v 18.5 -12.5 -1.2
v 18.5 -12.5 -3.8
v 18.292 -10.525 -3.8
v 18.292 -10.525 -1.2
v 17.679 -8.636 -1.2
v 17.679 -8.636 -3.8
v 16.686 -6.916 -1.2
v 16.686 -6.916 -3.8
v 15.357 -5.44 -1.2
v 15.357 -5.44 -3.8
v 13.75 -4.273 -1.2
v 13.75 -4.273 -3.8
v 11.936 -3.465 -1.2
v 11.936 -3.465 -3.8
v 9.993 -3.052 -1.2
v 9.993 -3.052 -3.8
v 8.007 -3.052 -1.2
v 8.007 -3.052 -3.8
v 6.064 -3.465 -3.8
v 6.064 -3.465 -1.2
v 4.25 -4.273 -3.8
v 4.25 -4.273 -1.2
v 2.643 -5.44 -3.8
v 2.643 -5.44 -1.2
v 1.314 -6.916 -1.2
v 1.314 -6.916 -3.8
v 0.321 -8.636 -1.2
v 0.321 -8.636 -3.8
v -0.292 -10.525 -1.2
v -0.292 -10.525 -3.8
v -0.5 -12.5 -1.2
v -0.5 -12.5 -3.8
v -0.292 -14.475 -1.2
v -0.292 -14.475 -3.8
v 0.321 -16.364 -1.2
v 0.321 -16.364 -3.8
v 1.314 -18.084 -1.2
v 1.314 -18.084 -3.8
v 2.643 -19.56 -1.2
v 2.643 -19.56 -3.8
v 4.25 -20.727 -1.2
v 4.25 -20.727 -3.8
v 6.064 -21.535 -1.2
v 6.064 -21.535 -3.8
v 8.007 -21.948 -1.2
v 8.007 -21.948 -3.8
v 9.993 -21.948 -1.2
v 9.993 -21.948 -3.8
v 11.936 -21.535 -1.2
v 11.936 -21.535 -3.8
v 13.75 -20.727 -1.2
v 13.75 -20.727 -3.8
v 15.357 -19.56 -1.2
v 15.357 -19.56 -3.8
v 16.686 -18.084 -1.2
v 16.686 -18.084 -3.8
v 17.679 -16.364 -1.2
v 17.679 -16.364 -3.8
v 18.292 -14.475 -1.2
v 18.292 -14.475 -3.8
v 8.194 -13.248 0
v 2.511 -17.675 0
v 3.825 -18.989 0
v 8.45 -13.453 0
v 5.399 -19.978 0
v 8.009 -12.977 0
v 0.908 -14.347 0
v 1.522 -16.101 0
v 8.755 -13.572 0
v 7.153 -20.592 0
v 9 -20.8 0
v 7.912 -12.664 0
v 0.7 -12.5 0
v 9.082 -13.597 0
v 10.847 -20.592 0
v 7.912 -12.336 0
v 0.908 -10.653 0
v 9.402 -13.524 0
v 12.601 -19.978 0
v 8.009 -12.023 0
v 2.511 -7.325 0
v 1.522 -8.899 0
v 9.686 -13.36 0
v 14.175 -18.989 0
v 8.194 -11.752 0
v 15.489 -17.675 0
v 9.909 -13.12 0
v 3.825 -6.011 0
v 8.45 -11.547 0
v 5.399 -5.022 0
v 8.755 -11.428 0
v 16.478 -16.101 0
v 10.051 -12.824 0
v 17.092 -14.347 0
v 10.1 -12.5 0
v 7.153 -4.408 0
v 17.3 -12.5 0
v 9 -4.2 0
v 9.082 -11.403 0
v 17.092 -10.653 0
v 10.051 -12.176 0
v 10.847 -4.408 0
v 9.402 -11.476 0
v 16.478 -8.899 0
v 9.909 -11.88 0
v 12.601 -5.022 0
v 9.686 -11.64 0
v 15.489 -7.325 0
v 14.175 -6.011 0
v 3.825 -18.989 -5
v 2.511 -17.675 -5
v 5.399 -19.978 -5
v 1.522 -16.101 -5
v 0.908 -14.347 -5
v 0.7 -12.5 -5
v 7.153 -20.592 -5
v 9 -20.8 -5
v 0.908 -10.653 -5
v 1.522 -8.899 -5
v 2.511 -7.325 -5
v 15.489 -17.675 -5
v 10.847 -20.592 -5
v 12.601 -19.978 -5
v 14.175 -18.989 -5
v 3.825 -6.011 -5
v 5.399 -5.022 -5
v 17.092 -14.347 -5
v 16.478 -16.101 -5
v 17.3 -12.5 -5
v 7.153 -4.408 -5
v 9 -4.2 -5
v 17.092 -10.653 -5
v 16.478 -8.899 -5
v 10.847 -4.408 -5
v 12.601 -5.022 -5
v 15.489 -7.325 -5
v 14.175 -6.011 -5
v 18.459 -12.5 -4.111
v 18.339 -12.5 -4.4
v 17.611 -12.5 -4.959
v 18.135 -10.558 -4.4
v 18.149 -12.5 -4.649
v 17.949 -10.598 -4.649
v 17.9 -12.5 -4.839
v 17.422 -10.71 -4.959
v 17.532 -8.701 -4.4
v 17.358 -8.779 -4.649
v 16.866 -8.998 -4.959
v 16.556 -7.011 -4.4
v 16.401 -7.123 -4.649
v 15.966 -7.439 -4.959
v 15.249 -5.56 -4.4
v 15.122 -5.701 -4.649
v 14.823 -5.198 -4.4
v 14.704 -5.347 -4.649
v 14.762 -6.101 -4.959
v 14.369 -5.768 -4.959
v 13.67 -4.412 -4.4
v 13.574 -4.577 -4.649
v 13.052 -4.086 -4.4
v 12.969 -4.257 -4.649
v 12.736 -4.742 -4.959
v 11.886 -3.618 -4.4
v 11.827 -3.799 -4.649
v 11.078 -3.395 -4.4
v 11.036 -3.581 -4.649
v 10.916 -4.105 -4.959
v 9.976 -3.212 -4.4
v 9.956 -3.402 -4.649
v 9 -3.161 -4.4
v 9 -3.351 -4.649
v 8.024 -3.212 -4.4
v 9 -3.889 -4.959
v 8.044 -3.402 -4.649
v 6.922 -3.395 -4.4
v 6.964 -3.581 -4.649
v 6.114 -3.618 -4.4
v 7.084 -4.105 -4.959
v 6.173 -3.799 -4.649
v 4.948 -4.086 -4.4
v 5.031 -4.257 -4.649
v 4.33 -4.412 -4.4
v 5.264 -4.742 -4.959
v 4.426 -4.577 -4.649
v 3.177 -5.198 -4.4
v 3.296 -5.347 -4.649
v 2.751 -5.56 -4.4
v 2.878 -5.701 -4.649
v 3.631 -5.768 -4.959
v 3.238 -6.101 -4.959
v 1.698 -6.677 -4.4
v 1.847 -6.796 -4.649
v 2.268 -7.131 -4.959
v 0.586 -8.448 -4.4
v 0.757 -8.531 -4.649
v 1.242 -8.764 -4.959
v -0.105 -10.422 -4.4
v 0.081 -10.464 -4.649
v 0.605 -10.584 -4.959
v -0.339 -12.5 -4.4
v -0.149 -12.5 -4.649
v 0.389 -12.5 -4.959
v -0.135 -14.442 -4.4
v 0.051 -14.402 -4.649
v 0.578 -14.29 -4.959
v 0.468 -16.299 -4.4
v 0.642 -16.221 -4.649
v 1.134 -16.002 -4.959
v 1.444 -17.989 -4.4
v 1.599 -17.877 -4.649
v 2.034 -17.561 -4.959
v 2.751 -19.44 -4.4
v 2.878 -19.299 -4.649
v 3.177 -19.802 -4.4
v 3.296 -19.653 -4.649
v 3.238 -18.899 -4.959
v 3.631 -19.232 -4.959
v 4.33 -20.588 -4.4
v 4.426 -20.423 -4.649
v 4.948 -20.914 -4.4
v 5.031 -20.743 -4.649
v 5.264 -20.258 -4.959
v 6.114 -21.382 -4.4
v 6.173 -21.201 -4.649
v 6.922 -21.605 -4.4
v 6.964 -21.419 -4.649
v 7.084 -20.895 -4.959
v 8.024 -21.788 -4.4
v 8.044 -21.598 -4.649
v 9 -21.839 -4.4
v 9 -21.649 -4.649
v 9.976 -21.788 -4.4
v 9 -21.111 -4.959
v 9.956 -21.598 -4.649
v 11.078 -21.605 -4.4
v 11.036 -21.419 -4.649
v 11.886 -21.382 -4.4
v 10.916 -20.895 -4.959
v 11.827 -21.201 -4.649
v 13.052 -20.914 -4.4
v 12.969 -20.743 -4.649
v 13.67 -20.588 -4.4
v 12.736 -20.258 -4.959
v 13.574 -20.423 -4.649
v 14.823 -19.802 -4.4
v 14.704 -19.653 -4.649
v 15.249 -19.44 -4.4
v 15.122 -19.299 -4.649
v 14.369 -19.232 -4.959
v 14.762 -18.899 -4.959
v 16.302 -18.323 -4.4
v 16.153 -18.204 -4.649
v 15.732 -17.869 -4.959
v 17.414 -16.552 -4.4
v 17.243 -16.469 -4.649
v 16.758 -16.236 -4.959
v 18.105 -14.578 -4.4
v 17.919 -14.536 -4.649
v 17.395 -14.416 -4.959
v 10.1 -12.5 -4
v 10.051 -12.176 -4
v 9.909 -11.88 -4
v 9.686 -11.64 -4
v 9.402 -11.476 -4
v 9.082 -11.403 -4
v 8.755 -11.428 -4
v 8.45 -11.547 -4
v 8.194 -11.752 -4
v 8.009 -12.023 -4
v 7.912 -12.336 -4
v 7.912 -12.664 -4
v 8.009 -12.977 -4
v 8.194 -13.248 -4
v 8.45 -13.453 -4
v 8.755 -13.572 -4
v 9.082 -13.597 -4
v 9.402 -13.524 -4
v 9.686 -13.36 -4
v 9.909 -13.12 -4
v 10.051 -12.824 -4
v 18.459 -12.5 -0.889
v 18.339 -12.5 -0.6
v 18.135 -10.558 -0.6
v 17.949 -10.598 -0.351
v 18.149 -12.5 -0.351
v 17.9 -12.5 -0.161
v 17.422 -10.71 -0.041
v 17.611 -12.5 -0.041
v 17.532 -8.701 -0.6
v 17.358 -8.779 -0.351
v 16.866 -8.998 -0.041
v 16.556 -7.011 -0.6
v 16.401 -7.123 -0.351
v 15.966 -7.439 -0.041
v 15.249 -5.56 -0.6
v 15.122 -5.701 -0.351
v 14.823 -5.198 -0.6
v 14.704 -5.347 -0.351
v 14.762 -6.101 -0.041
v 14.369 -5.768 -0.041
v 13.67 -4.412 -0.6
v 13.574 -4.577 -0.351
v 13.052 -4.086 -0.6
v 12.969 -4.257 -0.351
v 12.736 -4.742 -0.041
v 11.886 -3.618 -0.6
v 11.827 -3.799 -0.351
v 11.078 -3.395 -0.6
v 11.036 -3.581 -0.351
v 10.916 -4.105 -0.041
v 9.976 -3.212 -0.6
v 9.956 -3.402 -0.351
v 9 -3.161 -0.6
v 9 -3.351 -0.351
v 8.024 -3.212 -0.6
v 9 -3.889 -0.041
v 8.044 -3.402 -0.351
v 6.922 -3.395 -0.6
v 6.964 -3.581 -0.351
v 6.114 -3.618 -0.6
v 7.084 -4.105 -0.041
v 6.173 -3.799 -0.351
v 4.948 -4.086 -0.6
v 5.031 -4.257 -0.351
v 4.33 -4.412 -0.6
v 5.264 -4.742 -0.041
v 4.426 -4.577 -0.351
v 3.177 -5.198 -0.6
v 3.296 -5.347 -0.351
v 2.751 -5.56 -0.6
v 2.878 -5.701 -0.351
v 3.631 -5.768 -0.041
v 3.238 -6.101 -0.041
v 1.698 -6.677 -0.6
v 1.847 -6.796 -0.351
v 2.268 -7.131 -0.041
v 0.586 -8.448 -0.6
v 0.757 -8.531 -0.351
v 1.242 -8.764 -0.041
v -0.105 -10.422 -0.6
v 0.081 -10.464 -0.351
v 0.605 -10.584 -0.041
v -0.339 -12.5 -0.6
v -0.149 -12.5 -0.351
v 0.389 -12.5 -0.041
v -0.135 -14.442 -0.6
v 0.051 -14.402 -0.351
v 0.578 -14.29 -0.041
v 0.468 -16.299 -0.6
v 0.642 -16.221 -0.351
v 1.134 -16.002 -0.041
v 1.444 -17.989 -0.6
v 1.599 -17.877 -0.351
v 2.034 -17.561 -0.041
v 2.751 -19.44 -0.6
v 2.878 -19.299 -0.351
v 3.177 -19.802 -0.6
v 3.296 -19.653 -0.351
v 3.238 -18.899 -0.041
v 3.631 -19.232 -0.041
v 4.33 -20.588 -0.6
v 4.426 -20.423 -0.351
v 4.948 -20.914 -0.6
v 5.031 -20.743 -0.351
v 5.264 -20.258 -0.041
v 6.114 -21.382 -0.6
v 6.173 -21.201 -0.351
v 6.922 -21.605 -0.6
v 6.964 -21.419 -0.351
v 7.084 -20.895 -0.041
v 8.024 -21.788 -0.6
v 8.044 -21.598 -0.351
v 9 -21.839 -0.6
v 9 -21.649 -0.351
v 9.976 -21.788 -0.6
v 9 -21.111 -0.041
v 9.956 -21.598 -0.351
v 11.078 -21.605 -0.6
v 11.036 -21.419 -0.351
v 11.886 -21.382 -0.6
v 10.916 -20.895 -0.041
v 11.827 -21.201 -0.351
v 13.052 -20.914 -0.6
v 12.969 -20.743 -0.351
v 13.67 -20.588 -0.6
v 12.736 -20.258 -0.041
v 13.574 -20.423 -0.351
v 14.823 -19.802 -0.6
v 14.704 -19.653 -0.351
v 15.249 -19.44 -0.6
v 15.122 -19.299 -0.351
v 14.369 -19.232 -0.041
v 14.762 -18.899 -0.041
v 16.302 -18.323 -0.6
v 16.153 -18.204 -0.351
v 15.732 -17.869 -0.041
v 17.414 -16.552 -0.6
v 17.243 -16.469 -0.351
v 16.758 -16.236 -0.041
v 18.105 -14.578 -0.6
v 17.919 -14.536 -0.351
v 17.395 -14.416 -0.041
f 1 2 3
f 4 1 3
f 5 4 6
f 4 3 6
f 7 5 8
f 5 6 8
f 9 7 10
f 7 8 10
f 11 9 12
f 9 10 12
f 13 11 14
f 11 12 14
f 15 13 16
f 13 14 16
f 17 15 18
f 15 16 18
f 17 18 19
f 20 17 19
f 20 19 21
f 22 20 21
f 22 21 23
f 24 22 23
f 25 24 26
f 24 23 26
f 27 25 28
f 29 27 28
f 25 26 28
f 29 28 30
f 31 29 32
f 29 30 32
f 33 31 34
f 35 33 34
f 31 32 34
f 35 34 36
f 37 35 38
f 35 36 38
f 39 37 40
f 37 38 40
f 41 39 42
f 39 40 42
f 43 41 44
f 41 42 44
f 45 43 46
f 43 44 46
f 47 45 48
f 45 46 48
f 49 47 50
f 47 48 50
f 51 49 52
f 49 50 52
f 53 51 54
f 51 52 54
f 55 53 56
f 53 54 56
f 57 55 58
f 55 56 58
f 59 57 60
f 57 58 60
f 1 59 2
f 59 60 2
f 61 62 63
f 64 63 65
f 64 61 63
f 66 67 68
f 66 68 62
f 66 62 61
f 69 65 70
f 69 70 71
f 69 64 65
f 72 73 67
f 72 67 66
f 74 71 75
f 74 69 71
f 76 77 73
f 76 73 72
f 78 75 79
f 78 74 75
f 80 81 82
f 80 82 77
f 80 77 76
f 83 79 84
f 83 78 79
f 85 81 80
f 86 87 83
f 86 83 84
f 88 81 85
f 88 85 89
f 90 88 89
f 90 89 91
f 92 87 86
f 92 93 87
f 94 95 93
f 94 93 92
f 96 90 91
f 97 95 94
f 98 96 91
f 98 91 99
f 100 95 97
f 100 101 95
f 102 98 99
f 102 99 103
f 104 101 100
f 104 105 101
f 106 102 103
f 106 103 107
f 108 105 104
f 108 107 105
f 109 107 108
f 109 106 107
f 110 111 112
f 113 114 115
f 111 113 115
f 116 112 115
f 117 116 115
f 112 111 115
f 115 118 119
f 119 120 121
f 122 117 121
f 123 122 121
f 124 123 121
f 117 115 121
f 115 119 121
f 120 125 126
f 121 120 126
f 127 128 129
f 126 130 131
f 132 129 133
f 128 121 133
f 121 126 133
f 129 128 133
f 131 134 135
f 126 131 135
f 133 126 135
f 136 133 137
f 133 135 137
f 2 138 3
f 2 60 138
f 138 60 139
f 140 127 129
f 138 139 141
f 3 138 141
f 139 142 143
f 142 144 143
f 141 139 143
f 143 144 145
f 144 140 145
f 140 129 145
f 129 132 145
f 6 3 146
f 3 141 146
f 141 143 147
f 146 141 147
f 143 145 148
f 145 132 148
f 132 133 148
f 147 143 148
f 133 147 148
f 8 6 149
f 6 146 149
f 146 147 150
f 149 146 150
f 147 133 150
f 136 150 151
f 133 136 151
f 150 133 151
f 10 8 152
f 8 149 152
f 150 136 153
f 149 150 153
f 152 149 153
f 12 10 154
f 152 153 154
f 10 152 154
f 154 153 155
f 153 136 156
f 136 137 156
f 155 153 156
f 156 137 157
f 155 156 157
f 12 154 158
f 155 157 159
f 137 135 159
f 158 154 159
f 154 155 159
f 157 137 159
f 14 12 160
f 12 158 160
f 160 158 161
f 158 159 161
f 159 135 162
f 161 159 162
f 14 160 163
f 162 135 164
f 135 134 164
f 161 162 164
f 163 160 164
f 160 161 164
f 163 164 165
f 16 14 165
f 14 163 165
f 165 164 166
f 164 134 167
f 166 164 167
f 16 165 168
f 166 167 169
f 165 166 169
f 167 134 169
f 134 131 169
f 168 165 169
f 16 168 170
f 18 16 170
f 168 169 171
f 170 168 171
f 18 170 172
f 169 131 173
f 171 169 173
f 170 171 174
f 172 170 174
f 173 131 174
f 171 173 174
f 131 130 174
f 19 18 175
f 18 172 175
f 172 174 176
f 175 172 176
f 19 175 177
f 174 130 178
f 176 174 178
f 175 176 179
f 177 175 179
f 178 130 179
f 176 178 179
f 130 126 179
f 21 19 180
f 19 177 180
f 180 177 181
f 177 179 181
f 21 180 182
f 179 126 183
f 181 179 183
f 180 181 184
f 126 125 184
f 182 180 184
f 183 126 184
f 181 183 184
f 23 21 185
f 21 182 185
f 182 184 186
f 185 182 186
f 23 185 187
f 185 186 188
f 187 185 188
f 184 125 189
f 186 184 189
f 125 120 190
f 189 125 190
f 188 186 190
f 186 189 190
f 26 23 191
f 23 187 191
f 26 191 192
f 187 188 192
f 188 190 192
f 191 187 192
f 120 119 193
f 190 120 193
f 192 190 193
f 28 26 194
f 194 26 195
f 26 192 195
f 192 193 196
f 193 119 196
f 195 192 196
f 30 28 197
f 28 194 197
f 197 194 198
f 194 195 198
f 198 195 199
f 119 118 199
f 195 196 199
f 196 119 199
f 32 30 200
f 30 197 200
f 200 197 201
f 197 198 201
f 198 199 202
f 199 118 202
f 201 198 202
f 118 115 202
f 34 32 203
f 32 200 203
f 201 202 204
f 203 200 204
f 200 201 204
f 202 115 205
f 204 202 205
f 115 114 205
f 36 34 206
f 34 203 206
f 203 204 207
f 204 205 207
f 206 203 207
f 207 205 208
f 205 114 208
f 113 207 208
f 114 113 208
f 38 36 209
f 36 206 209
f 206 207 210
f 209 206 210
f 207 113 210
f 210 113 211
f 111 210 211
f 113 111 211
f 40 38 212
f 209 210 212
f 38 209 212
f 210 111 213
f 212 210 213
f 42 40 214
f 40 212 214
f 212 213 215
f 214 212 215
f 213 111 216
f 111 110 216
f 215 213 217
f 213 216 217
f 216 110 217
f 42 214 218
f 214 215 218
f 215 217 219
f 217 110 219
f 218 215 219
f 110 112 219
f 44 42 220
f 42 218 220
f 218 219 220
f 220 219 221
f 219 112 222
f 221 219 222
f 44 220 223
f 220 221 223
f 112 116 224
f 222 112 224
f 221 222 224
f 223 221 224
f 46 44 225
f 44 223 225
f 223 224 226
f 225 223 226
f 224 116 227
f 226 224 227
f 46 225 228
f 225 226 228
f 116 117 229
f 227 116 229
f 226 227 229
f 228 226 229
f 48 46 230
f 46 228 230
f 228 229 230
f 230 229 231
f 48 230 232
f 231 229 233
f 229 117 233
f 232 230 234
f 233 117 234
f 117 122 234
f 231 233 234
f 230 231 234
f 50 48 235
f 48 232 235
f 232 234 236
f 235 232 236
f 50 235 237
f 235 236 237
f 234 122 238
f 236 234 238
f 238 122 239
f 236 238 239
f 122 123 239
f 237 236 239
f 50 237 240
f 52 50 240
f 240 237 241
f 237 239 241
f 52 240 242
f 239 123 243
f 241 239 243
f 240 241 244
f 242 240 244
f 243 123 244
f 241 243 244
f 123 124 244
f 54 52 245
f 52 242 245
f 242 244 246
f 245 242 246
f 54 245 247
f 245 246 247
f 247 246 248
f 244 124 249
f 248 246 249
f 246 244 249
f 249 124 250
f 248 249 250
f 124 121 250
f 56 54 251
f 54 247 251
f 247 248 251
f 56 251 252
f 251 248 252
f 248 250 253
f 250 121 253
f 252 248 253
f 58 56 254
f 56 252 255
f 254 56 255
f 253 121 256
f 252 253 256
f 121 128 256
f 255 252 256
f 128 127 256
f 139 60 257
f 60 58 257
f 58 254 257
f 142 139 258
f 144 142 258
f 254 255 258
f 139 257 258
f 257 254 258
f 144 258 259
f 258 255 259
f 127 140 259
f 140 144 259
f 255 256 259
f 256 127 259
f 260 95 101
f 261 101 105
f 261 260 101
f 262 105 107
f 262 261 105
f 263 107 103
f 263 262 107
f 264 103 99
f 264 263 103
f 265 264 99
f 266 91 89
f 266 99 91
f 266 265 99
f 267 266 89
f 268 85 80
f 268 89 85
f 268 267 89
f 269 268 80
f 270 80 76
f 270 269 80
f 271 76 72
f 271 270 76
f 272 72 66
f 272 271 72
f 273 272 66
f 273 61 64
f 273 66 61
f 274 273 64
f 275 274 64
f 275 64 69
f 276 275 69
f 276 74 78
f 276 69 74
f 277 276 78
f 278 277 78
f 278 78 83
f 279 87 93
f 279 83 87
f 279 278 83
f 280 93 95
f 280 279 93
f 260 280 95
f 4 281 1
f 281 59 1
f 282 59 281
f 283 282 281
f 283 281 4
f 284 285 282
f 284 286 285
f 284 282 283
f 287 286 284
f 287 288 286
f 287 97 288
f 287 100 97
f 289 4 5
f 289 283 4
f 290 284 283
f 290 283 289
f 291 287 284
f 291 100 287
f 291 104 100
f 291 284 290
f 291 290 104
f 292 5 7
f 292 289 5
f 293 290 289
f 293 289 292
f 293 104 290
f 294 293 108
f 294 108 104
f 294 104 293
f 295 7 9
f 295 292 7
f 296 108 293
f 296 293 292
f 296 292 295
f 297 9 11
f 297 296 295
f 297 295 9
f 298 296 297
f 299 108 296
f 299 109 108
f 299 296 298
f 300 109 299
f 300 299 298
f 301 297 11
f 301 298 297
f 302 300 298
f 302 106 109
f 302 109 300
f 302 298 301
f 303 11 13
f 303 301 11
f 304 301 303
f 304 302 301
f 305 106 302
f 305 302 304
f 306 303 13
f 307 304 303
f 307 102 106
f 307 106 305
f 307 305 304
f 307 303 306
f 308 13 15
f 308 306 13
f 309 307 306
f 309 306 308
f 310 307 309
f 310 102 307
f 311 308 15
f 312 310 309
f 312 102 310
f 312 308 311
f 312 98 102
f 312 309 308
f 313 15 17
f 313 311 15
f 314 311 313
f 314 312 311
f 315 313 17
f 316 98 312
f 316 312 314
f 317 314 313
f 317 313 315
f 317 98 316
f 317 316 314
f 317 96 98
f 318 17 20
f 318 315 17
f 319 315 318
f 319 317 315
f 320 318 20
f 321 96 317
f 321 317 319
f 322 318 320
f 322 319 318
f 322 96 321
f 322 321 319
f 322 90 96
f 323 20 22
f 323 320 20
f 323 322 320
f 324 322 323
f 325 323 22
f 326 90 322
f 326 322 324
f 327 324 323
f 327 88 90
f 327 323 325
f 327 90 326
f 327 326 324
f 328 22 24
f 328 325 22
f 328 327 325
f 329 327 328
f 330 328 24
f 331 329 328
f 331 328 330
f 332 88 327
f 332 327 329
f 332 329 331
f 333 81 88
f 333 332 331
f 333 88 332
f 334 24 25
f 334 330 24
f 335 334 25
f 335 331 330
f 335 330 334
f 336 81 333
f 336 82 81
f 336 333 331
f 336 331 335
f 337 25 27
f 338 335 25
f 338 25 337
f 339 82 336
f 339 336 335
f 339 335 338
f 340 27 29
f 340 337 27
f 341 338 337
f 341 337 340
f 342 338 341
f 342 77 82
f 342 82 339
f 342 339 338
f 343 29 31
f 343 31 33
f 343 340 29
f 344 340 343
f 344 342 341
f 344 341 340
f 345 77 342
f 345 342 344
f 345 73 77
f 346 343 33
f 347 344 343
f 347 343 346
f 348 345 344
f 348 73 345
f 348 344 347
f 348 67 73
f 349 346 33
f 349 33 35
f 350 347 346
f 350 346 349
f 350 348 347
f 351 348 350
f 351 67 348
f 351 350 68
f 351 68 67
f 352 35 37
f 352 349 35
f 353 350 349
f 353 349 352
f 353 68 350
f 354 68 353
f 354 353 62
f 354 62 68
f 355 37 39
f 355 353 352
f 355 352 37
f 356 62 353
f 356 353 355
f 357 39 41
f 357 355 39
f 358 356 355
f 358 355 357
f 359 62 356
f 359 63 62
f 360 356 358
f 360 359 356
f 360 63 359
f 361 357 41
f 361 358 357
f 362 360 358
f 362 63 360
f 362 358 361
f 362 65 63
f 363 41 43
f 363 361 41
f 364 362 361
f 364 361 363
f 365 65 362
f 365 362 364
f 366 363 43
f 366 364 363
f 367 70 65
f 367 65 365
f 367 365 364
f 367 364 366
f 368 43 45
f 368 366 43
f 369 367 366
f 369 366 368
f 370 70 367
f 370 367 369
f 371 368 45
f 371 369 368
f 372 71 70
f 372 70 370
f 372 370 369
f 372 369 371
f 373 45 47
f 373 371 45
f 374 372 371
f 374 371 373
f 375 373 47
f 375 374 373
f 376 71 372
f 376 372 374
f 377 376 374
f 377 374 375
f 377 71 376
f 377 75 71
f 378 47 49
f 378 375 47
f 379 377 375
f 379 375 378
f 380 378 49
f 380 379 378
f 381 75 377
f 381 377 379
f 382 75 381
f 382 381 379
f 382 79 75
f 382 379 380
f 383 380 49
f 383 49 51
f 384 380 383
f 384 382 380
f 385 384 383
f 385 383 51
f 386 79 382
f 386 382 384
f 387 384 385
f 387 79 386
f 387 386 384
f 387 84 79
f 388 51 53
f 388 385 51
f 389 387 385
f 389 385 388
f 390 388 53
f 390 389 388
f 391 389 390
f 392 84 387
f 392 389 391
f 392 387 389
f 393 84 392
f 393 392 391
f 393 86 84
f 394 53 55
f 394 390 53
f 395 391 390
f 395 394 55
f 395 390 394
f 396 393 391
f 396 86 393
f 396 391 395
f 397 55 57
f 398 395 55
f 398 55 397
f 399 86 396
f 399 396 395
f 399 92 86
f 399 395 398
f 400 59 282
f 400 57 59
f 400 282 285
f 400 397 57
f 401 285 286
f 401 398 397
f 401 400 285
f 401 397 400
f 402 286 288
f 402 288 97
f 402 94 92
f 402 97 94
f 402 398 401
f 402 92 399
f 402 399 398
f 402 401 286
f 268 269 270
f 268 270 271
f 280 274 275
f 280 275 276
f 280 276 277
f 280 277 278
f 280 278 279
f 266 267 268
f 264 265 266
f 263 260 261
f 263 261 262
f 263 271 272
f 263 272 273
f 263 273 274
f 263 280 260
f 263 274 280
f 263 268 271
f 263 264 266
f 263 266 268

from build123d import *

# Parameters (mm, degrees)
CYLINDER013_R     = 1.1
CYLINDER013_DEPTH = 5
CYLINDER012_R     = 9.5
CYLINDER012_DEPTH = 5
FILLET002003_R    = 1.2


with BuildPart() as footbase001:
    # Cylinder013 → Cylinder013 (new body)
    with BuildSketch(Plane(origin=(9, 9.5, -4), x_dir=(1, 0, 0), z_dir=(0, 0, 1))):
        Circle(CYLINDER013_R)
    extrude(amount=CYLINDER013_DEPTH)


with BuildPart() as foot:
    # Cylinder012 → Cylinder012 (new body)
    with BuildSketch(Plane(origin=(9, 9.5, -5), x_dir=(1, 0, 0), z_dir=(0, 0, 1))):
        Circle(CYLINDER012_R)
    extrude(amount=CYLINDER012_DEPTH)

    # Cut001002: cut FootBase001
    add(footbase001.part, mode=Mode.SUBTRACT)


with BuildPart() as foot_1:
    # Cut001002 placement: moved
    add(foot.part.moved(Location((0, -22, 0))))

    # Fillet002003
    fillet002003_edges = [foot_1.edges().sort_by_distance(p)[0] for p in [
        (-0.5, -12.5, 0),
        (-0.5, -12.5, -5),
    ]]
    fillet(fillet002003_edges, radius=FILLET002003_R)


solid = foot_1.part
